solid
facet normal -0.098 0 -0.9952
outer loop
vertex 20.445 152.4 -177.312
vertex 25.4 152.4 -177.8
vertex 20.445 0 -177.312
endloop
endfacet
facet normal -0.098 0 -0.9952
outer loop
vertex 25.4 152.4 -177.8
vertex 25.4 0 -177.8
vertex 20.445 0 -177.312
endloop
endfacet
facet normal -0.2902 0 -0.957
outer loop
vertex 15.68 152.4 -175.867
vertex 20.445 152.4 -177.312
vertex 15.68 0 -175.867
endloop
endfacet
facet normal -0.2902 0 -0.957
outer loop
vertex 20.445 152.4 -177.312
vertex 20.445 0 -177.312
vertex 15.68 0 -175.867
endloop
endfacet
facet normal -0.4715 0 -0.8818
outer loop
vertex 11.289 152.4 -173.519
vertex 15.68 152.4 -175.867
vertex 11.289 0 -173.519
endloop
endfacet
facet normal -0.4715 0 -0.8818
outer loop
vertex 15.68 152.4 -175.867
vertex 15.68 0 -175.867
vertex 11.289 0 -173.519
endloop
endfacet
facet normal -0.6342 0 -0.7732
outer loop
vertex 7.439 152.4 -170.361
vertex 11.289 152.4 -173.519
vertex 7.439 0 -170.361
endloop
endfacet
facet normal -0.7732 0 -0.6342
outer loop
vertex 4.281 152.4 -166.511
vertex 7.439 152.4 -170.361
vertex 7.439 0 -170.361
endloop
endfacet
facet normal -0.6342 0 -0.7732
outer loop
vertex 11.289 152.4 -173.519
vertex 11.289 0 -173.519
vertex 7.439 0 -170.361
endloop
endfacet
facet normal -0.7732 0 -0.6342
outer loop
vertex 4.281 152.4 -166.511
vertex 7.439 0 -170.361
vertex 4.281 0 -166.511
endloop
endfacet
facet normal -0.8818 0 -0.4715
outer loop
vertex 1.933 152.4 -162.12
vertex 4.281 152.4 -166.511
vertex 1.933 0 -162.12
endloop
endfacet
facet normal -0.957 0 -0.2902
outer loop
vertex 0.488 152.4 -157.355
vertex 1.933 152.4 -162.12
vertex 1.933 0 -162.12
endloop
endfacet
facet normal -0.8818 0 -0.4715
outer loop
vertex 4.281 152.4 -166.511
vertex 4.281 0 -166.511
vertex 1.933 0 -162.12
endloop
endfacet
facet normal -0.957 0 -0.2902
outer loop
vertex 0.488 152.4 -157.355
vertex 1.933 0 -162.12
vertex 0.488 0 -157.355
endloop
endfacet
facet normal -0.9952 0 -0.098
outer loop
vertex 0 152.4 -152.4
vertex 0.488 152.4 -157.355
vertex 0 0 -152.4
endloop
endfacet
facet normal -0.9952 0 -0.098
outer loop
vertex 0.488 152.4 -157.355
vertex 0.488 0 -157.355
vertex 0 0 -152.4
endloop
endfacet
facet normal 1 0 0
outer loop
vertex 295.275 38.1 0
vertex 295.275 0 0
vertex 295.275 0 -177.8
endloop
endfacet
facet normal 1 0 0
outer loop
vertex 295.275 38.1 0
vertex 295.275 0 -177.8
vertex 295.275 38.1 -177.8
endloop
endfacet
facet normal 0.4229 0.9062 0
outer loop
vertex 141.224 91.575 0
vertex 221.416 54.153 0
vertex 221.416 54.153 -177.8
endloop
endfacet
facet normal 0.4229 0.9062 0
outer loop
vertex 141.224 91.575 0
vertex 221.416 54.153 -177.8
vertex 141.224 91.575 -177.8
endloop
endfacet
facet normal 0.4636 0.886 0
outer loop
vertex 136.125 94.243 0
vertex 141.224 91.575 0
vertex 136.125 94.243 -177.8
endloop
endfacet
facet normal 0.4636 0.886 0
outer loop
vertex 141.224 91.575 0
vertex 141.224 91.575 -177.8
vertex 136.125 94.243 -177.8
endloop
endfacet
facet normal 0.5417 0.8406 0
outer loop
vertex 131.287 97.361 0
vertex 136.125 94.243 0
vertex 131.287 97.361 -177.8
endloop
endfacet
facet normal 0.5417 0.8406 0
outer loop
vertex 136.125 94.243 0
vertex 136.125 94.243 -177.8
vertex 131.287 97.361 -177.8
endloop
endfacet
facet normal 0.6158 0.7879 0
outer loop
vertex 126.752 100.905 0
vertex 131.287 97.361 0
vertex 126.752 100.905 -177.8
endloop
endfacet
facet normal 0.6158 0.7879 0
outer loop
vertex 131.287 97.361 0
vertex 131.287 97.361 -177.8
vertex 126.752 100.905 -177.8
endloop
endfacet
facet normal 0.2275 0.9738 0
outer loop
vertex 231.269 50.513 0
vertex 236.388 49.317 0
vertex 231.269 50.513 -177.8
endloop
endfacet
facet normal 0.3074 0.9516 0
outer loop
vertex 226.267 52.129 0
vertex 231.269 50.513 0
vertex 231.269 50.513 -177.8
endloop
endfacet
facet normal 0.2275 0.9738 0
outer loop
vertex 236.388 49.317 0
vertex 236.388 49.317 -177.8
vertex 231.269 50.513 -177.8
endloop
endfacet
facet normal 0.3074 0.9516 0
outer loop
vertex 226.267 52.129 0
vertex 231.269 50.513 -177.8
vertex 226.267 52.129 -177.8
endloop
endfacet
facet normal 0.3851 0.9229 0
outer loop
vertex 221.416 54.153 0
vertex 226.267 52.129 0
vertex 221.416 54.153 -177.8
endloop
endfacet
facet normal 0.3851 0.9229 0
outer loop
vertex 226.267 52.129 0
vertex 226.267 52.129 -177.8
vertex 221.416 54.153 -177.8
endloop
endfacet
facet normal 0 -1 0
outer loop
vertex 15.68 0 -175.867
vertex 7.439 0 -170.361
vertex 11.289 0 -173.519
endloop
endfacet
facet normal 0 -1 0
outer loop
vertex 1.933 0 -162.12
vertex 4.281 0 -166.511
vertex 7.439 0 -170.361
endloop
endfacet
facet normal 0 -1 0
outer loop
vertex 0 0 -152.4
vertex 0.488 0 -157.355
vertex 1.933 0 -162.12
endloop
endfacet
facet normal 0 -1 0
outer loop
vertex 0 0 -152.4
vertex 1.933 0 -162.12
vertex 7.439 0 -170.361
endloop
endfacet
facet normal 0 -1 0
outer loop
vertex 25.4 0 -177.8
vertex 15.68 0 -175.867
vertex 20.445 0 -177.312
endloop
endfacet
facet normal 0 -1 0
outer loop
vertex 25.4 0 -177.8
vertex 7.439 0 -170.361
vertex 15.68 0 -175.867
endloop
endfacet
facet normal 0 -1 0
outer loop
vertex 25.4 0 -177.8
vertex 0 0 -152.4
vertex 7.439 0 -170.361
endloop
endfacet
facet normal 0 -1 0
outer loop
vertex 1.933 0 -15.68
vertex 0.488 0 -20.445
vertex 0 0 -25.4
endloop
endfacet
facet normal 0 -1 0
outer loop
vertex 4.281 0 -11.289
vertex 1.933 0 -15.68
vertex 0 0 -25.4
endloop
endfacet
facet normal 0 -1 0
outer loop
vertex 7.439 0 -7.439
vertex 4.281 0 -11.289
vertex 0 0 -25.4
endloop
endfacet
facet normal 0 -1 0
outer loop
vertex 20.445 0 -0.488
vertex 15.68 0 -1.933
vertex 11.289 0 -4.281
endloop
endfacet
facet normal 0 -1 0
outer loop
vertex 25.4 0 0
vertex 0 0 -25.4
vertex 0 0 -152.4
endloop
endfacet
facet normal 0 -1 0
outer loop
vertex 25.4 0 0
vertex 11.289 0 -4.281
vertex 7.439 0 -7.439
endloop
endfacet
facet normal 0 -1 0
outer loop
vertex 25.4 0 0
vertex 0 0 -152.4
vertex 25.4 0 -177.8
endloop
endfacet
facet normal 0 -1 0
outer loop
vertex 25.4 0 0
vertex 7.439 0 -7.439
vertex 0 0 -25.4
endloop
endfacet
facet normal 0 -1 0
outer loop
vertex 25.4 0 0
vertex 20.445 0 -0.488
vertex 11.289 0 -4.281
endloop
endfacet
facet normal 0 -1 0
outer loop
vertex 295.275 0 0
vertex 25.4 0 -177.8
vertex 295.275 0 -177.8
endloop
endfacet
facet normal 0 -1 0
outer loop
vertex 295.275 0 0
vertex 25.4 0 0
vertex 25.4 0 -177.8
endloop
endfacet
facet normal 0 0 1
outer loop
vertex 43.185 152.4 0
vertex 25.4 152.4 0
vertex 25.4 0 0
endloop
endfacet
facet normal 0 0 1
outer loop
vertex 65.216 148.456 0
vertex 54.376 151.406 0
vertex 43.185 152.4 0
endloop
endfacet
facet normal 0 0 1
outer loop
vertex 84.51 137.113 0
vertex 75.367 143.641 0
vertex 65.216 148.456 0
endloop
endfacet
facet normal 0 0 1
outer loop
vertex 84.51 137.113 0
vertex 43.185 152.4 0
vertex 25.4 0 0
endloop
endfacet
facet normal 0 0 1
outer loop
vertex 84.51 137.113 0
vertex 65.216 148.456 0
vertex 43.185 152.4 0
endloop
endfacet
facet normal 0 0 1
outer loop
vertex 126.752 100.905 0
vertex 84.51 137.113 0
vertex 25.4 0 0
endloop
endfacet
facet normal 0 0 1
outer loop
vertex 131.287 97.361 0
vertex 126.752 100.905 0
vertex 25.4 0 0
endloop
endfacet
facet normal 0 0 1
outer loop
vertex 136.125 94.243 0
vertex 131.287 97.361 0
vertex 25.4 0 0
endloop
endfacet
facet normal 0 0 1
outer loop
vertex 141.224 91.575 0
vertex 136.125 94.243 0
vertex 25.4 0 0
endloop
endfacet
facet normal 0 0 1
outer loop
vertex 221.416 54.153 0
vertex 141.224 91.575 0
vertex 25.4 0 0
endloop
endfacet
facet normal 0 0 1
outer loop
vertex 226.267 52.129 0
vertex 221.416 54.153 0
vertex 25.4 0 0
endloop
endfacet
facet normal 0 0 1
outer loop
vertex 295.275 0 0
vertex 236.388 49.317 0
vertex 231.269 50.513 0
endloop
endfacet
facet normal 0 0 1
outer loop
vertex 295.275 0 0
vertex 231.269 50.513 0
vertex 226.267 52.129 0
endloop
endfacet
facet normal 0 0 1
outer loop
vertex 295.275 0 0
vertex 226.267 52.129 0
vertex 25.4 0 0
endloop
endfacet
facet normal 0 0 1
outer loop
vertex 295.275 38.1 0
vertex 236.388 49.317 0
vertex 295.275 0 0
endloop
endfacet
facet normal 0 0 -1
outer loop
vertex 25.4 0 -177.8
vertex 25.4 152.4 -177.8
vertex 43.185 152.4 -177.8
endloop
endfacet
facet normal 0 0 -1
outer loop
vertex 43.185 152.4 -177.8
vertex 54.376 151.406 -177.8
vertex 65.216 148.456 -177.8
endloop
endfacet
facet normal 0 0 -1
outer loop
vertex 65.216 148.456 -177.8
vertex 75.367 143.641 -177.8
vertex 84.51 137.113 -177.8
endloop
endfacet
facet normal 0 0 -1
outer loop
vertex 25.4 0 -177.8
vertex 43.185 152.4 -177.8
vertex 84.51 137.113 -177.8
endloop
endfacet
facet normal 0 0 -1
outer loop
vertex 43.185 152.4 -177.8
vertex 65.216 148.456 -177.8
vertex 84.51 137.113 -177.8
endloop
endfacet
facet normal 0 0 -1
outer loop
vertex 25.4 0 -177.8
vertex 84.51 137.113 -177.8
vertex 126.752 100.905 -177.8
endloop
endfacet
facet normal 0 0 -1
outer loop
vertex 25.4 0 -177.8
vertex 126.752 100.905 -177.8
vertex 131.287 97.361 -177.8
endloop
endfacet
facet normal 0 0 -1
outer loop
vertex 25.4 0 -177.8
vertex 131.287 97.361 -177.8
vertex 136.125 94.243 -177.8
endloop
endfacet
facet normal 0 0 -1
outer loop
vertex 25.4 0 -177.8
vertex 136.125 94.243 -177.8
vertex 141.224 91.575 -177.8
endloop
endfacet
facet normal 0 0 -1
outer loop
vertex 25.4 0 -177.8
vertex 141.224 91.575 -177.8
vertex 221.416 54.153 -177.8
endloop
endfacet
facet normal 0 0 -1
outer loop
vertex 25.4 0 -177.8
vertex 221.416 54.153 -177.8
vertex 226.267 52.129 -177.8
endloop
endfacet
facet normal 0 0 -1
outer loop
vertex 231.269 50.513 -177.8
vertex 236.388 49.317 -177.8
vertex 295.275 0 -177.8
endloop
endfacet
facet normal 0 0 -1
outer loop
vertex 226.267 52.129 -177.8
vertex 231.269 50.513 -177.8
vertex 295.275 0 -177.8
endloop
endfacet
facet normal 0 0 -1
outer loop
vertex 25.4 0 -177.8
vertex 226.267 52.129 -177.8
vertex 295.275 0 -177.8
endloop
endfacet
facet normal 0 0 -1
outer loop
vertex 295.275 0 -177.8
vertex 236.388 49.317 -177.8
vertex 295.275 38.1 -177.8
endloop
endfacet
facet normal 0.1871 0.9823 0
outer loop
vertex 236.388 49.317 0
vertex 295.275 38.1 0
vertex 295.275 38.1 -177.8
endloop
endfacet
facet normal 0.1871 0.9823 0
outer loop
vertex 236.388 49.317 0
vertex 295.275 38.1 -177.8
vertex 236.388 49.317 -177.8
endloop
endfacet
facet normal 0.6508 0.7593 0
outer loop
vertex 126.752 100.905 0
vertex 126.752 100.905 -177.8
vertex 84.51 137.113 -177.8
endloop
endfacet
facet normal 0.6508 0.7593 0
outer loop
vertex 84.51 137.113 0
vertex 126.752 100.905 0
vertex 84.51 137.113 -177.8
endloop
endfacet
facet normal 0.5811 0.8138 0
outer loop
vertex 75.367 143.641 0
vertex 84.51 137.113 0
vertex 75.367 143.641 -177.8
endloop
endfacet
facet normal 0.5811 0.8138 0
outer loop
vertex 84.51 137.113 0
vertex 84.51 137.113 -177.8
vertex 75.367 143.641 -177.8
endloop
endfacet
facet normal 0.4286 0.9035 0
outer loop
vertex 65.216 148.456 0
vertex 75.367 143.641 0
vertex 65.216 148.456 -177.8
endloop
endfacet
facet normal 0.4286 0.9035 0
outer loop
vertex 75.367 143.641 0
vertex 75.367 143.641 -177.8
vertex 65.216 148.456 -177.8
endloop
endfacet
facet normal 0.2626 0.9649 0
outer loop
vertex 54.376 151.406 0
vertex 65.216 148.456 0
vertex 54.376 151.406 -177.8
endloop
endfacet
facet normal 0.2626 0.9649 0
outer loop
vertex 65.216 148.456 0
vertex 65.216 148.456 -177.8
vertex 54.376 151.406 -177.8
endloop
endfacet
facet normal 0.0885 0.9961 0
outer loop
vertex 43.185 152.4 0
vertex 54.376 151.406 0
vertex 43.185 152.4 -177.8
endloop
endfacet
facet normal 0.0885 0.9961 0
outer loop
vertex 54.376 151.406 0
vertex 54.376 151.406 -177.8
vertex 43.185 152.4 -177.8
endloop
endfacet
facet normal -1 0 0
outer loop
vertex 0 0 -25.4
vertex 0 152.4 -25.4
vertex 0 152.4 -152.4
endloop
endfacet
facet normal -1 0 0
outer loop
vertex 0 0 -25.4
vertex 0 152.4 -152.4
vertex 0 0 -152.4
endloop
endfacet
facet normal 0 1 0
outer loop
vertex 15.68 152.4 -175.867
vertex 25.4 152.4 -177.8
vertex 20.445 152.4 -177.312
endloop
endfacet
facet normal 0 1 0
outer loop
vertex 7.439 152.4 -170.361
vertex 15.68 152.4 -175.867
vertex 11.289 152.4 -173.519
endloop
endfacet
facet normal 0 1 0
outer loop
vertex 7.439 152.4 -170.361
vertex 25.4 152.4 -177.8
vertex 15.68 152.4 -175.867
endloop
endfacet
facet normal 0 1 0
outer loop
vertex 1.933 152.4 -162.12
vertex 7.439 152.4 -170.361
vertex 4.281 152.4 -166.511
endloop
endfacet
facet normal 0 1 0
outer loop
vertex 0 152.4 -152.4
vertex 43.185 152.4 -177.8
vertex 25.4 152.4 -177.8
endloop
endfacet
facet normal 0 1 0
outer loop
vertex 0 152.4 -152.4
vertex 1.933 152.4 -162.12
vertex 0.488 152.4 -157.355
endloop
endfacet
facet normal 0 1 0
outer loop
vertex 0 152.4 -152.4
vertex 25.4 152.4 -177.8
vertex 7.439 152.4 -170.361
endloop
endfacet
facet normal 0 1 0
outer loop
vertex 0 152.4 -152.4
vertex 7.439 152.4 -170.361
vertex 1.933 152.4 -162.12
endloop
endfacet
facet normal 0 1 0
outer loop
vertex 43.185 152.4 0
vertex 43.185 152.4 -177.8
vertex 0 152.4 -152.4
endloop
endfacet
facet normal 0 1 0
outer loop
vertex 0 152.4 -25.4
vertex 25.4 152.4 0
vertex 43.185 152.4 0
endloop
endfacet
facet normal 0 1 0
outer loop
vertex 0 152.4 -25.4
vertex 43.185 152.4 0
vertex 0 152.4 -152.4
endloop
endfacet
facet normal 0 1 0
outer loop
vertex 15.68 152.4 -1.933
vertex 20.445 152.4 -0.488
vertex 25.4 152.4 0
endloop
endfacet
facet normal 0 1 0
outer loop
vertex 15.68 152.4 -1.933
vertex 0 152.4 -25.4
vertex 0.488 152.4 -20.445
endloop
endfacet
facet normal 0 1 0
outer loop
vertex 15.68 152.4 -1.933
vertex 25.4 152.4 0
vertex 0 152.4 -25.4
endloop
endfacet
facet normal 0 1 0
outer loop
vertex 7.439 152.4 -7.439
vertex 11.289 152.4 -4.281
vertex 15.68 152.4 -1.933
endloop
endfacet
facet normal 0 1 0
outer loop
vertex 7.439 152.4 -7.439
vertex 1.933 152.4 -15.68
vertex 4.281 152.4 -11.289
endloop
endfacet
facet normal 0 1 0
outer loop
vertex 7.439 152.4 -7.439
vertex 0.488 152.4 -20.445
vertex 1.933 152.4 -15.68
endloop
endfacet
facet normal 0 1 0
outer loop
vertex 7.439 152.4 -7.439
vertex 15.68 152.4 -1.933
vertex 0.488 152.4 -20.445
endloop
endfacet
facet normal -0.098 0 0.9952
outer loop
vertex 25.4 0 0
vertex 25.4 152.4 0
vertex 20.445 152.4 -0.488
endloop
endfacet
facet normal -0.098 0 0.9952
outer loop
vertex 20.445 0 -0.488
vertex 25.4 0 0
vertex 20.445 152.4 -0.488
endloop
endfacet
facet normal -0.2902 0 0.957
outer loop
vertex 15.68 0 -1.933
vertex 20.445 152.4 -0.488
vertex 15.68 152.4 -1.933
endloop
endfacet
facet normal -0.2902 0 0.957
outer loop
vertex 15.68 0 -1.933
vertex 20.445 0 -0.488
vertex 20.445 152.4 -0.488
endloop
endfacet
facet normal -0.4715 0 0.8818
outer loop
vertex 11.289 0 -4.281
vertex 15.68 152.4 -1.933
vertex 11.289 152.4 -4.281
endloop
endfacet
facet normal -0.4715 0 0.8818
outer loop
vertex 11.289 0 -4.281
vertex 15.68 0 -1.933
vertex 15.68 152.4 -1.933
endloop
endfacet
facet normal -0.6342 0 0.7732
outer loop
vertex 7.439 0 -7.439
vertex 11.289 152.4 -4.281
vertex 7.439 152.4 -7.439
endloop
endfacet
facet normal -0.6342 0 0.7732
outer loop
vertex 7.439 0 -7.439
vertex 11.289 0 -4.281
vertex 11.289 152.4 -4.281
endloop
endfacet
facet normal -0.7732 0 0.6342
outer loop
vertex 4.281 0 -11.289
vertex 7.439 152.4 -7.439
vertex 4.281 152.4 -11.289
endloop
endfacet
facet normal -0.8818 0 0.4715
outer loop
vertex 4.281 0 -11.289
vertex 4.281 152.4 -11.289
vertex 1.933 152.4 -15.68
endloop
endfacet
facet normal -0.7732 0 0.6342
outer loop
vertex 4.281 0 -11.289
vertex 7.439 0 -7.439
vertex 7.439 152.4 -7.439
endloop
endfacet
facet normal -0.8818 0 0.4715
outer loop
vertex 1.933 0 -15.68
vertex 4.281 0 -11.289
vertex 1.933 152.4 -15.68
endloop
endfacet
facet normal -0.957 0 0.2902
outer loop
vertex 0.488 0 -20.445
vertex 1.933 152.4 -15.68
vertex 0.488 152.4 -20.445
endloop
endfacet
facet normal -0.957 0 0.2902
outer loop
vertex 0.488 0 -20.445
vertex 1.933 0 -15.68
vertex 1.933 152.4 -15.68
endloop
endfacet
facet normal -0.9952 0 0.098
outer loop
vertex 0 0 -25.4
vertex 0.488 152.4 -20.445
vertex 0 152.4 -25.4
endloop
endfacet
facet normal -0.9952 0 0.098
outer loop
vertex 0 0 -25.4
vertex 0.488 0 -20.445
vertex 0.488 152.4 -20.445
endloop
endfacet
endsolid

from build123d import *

# Parameters (mm, degrees)
EXTRUDE1_DEPTH = 177.8
FILLET1_R      = 63.5
FILLET2_R      = 25.4


with BuildPart() as part:
    # Sketch1 → Extrude1 (new body)
    with BuildSketch(Plane.XY):
        Polygon((0, 152.4), (0, 0), (295.275, 0), (295.275, 38.1), (228.6, 50.8), (133.35, 95.25), (66.675, 152.4), align=None)
    extrude(amount=-EXTRUDE1_DEPTH)

    # Fillet1
    fillet1_edges = [part.edges().sort_by_distance(p)[0] for p in [
        (228.6, 50.8, -88.9),
        (66.675, 152.4, -88.9),
        (133.35, 95.25, -88.9),
    ]]
    fillet(fillet1_edges, radius=FILLET1_R)

    # Fillet2
    fillet2_edges = [part.edges().sort_by_distance(p)[0] for p in [
        (0, 76.2, -177.8),
        (0, 76.2, 0),
    ]]
    fillet(fillet2_edges, radius=FILLET2_R)


solid = part.part
